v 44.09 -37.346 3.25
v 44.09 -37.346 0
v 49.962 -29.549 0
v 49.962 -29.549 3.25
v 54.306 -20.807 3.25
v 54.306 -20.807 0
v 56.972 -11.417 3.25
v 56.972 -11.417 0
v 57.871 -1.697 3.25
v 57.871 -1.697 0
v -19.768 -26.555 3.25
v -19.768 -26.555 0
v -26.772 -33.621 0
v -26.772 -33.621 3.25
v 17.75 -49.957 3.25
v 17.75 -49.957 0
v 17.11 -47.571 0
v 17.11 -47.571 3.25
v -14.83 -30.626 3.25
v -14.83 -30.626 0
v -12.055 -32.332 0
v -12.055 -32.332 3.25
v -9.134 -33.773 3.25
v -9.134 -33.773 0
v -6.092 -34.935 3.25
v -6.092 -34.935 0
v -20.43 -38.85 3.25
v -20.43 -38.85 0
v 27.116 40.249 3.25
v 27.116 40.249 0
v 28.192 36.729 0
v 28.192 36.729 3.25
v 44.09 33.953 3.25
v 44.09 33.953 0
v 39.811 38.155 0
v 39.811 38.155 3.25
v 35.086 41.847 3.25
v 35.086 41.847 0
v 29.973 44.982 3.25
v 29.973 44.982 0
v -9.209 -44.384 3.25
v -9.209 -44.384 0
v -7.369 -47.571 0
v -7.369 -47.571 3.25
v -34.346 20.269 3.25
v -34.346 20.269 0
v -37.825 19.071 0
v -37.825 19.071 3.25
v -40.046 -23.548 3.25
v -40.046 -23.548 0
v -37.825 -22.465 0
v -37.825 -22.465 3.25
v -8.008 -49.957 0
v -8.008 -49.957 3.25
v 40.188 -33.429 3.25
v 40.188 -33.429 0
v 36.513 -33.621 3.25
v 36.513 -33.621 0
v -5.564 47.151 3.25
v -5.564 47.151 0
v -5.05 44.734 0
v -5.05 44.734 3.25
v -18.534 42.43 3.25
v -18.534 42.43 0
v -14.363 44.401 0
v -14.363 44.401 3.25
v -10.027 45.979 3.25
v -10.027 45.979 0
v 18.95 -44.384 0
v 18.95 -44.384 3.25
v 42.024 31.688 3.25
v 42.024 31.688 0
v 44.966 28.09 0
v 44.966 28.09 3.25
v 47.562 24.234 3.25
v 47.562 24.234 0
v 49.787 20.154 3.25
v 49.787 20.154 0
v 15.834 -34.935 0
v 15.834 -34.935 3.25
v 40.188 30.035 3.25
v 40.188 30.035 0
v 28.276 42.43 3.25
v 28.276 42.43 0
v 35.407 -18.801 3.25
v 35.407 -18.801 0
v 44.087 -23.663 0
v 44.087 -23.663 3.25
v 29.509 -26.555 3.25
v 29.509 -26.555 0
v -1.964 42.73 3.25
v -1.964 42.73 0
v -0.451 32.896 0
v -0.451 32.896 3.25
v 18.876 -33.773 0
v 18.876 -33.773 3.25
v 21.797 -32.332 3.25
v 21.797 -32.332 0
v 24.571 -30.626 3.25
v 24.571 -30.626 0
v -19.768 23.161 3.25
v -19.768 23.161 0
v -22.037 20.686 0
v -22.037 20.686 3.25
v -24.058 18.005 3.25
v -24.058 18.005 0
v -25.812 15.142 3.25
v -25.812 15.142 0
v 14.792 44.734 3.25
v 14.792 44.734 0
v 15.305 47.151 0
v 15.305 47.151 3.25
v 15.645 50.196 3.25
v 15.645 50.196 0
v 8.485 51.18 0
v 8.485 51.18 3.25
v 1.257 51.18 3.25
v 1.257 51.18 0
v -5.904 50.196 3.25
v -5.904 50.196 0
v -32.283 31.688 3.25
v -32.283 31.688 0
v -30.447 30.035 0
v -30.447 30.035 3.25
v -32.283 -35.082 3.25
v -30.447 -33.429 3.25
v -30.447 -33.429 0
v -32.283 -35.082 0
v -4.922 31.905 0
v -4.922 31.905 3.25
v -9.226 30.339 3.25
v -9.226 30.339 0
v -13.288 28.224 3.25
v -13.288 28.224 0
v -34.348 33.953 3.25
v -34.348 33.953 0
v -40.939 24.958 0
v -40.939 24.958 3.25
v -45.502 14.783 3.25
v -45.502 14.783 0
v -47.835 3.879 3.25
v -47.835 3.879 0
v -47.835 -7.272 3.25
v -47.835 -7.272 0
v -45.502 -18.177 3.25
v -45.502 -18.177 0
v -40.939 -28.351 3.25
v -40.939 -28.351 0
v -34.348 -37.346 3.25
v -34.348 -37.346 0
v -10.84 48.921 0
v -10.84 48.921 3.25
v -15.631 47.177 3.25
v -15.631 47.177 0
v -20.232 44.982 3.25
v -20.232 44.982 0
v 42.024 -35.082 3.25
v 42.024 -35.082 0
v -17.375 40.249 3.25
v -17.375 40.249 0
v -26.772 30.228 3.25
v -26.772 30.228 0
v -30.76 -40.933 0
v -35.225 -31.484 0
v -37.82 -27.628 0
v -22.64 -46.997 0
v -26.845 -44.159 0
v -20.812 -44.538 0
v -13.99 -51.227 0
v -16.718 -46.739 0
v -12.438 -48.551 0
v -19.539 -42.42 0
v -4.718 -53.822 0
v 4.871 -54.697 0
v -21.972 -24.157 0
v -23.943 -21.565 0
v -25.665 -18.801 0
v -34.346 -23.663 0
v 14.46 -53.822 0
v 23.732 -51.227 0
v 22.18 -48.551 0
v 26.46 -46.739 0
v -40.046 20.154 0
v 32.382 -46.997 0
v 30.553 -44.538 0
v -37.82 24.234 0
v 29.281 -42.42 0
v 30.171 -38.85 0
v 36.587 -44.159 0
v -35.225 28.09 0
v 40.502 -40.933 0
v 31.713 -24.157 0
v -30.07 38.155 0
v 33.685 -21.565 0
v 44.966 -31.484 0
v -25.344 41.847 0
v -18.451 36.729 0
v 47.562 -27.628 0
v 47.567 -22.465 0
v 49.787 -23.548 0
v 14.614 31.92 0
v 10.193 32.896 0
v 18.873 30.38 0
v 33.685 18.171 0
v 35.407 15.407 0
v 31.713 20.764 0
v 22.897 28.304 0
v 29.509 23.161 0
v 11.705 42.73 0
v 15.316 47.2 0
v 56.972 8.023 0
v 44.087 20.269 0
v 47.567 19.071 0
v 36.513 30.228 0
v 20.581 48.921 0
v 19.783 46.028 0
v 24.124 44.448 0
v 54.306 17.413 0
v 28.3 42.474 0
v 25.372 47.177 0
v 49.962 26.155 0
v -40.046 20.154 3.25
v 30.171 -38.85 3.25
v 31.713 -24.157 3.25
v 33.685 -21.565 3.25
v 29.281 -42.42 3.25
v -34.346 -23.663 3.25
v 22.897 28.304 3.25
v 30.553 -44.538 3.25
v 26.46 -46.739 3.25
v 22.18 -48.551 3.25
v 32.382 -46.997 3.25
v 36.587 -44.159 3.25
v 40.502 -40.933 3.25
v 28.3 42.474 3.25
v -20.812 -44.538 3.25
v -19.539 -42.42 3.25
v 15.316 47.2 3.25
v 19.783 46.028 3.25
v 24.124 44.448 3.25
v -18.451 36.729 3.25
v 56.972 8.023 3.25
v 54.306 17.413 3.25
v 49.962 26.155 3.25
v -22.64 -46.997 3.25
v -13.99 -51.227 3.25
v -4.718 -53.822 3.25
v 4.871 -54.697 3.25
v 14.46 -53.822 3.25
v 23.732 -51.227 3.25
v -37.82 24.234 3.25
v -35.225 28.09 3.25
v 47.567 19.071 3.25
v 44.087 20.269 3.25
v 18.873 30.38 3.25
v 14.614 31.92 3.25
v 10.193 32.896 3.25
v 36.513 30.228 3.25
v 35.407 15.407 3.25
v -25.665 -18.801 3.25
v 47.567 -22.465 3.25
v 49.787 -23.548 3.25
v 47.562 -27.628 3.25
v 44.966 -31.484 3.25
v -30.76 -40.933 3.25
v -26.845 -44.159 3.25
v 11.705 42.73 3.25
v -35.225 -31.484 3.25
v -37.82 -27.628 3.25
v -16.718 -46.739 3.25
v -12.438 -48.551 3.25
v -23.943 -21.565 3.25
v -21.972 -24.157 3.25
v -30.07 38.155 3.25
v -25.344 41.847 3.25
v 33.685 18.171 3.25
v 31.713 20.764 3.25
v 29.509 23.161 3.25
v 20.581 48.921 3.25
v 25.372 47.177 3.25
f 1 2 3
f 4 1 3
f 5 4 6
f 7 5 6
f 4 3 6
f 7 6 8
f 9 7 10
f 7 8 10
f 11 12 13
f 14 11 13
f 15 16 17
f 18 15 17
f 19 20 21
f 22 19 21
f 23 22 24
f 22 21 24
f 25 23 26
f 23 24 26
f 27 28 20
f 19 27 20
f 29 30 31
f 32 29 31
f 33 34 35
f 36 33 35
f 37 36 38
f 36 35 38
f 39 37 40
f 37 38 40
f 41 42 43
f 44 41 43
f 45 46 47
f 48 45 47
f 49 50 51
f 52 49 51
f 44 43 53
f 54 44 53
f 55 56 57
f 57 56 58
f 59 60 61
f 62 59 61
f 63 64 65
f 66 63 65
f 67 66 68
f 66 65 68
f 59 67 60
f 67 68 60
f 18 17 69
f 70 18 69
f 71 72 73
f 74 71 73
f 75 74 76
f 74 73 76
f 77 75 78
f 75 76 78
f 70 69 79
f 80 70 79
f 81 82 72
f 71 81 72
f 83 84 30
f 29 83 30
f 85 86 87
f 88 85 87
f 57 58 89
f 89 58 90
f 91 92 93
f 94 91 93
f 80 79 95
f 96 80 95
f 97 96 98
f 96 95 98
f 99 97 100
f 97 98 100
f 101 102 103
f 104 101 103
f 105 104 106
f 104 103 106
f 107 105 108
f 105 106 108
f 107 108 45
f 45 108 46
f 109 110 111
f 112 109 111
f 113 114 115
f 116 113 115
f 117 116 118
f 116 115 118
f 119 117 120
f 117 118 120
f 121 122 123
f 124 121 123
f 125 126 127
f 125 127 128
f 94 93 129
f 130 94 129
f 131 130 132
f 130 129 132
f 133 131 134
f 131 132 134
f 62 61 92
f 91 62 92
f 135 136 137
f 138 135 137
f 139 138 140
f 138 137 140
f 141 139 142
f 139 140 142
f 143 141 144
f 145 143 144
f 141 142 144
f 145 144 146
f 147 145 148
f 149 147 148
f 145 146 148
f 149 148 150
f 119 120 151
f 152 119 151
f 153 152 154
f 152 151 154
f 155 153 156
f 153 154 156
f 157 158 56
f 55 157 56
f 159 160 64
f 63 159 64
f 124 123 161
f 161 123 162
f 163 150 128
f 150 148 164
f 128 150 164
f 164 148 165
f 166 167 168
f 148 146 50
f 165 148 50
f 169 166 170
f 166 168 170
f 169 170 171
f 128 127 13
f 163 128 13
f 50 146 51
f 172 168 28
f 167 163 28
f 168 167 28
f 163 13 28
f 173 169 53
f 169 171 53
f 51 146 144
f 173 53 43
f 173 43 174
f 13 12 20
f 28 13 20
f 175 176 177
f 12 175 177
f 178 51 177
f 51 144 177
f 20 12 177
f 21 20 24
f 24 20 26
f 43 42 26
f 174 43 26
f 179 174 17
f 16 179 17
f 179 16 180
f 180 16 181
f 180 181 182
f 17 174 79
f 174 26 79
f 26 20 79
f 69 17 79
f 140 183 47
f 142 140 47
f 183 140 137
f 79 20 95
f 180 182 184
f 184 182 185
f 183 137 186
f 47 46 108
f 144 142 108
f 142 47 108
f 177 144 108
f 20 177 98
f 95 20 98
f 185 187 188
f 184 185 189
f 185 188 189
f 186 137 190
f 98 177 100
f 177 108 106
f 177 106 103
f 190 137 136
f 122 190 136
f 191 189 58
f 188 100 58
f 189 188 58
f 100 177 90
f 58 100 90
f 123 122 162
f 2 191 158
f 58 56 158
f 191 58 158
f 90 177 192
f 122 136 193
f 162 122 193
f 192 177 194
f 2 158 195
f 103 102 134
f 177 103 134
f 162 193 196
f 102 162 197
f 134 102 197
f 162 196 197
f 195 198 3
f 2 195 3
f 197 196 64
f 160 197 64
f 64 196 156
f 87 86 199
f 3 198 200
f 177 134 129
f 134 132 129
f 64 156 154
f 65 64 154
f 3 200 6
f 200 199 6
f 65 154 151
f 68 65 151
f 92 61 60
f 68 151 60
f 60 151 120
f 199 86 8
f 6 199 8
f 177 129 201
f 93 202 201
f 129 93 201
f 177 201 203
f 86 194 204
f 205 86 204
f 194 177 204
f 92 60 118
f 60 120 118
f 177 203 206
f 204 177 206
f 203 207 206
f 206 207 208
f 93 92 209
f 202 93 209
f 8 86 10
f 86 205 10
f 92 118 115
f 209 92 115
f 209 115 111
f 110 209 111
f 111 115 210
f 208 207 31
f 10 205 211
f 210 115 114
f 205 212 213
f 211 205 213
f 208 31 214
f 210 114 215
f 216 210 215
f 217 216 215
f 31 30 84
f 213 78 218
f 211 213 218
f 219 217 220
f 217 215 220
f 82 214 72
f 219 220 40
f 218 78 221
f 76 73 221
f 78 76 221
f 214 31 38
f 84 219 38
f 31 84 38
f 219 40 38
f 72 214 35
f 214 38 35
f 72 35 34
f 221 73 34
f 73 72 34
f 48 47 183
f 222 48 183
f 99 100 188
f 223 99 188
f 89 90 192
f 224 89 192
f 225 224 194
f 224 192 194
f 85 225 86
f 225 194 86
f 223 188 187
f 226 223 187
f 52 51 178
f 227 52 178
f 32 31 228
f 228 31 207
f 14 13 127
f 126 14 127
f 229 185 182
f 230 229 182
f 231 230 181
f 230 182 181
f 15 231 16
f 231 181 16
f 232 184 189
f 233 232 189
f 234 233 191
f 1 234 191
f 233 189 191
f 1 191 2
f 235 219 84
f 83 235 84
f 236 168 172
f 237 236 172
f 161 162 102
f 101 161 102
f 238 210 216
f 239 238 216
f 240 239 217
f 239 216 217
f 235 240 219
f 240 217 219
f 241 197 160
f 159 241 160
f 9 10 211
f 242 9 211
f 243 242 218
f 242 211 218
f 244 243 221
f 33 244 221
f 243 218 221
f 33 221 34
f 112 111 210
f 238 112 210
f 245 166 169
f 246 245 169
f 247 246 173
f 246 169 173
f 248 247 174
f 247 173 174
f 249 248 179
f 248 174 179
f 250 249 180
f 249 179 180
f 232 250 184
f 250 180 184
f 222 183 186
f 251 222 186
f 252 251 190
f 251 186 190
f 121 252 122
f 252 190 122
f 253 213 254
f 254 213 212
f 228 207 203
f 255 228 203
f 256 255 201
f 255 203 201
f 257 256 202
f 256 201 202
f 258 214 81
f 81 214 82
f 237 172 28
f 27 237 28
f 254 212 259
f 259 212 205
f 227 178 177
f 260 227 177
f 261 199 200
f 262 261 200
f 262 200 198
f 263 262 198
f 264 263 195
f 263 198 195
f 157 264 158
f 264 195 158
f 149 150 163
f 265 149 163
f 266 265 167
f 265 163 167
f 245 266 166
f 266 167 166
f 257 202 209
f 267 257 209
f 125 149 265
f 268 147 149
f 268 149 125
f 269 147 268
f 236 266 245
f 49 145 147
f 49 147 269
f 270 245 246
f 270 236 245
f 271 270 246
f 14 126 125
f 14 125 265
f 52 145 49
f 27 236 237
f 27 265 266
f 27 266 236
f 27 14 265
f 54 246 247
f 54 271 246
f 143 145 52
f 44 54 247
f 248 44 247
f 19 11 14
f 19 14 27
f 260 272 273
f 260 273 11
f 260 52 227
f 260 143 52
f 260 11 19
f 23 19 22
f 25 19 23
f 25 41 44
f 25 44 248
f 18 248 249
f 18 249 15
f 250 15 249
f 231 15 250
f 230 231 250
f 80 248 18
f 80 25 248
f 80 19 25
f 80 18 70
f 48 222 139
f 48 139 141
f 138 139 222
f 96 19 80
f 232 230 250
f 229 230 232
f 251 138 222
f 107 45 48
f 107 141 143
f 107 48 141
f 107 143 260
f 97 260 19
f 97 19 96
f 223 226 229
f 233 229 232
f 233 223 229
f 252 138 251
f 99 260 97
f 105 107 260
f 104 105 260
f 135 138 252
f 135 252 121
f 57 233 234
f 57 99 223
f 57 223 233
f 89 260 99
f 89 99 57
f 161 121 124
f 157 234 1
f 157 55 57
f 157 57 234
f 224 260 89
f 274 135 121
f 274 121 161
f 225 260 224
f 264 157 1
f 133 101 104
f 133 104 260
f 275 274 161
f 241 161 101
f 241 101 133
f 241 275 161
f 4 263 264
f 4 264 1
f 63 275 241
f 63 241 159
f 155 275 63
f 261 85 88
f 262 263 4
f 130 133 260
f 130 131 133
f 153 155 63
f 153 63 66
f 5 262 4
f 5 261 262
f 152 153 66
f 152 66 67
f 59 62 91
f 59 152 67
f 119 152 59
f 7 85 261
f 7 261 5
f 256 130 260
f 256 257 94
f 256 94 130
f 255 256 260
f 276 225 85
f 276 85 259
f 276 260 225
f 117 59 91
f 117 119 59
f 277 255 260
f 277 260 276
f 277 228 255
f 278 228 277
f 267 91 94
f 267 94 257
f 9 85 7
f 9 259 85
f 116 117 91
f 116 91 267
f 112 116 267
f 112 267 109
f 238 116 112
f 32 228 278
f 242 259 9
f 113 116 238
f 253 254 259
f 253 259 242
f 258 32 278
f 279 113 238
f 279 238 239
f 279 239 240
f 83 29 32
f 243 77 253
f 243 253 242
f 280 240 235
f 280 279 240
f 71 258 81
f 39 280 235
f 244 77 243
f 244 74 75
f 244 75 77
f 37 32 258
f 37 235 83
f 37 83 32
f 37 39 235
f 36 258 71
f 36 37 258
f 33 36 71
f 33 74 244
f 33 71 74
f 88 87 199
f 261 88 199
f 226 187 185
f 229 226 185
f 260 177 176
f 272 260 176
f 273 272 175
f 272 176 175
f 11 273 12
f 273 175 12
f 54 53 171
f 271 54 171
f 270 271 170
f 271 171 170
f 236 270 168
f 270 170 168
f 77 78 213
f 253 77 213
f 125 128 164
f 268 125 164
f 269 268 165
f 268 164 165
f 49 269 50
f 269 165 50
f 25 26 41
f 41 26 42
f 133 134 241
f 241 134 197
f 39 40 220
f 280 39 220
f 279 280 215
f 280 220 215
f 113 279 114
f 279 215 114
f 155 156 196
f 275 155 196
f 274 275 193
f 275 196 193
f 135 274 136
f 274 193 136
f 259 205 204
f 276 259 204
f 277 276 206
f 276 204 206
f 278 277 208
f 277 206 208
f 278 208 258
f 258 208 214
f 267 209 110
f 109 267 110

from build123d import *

# Parameters (mm, degrees)
SKETCH1_R           = 53
BOSS_EXTRUDE2_DEPTH = 3.25


with BuildPart() as part:
    # Sketch1 → Boss-Extrude2 (new body)
    with BuildSketch(Plane.XY):
        with Locations((4.870724861, -1.696758811)):
            Circle(SKETCH1_R)
        with BuildLine():
            Line((47.566786932, -22.464700122), (49.787097659, -23.547618021))
            ThreePointArc((49.787097659, -23.547618021), (46.308922772, -29.586117847), (42.024200497, -35.081783024))
            Line((42.024200497, -35.081783024), (40.188393468, -33.42881495))
            Line((40.188393468, -33.42881495), (36.513472454, -33.621409399))
            Line((36.513472454, -33.621409399), (29.509466442, -26.555005195))
            ThreePointArc((29.509466442, -26.555005195), (32.729283137, -22.88403638), (35.406864683, -18.800681308))
            Line((35.406864683, -18.800681308), (44.08731235, -23.662779301))
            Line((44.08731235, -23.662779301), (47.566786932, -22.464700122))
        make_face(mode=Mode.SUBTRACT)
        with BuildLine():
            Line((47.566786932, 19.071182501), (44.08731235, 20.26926168))
            Line((44.08731235, 20.26926168), (35.406864683, 15.407163687))
            ThreePointArc((35.406864683, 15.407163687), (32.729283137, 19.490518759), (29.509466442, 23.161487574))
            Line((29.509466442, 23.161487574), (36.513472454, 30.227891778))
            Line((36.513472454, 30.227891778), (40.188393468, 30.035297329))
            Line((40.188393468, 30.035297329), (42.024200497, 31.688265402))
            ThreePointArc((42.024200497, 31.688265402), (46.308922772, 26.192600226), (49.787097659, 20.1541004))
            Line((49.787097659, 20.1541004), (47.566786932, 19.071182501))
        make_face(mode=Mode.SUBTRACT)
        with BuildLine():
            Line((28.299596439, 42.474362712), (27.116085982, 40.248503273))
            Line((27.116085982, 40.248503273), (28.192003411, 36.729335933))
            Line((28.192003411, 36.729335933), (22.897057483, 28.304096714))
            ThreePointArc((22.897057483, 28.304096714), (16.768473858, 31.218945174), (10.192574898, 32.896273901))
            Line((10.192574898, 32.896273901), (11.705406612, 42.729966432))
            Line((11.705406612, 42.729966432), (14.791684342, 44.734218625))
            Line((14.791684342, 44.734218625), (15.315817601, 47.200071738))
            ThreePointArc((15.315817601, 47.200071738), (21.971732028, 45.287872229), (28.299596439, 42.474362712))
        make_face(mode=Mode.SUBTRACT)
        with BuildLine():
            ThreePointArc((-18.5343822, 42.429668157), (-12.212969352, 45.240305281), (-5.563843448, 47.150558185))
            Line((-5.563843448, 47.150558185), (-5.05023462, 44.734218625))
            Line((-5.05023462, 44.734218625), (-1.963956889, 42.729966432))
            Line((-1.963956889, 42.729966432), (-0.451125175, 32.896273901))
            ThreePointArc((-0.451125175, 32.896273901), (-7.099980155, 31.192482917), (-13.288474299, 28.223860933))
            Line((-13.288474299, 28.223860933), (-18.450553688, 36.729335933))
            Line((-18.450553688, 36.729335933), (-17.374636259, 40.248503273))
            Line((-17.374636259, 40.248503273), (-18.5343822, 42.429668157))
        make_face(mode=Mode.SUBTRACT)
        with BuildLine():
            ThreePointArc((-40.045647936, 20.1541004), (-36.567473049, 26.192600226), (-32.282750775, 31.688265402))
            Line((-32.282750775, 31.688265402), (-30.446943745, 30.035297329))
            Line((-30.446943745, 30.035297329), (-26.772022731, 30.227891778))
            Line((-26.772022731, 30.227891778), (-19.76801672, 23.161487574))
            ThreePointArc((-19.76801672, 23.161487574), (-23.079377371, 19.369607397), (-25.812491143, 15.141894807))
            Line((-25.812491143, 15.141894807), (-34.345862627, 20.26926168))
            Line((-34.345862627, 20.26926168), (-37.825337209, 19.071182501))
            Line((-37.825337209, 19.071182501), (-40.045647936, 20.1541004))
        make_face(mode=Mode.SUBTRACT)
        with BuildLine():
            ThreePointArc((-32.282750775, -35.081783024), (-36.567473049, -29.586117847), (-40.045647936, -23.547618021))
            Line((-40.045647936, -23.547618021), (-37.825337209, -22.464700122))
            Line((-37.825337209, -22.464700122), (-34.345862627, -23.662779301))
            Line((-34.345862627, -23.662779301), (-25.66541496, -18.800681308))
            ThreePointArc((-25.66541496, -18.800681308), (-22.987833414, -22.88403638), (-19.76801672, -26.555005195))
            Line((-19.76801672, -26.555005195), (-26.772022731, -33.621409399))
            Line((-26.772022731, -33.621409399), (-30.446943745, -33.42881495))
            Line((-30.446943745, -33.42881495), (-32.282750775, -35.081783024))
        make_face(mode=Mode.SUBTRACT)
        with BuildLine():
            ThreePointArc((-8.008224552, -49.957231825), (-14.599447184, -47.695160892), (-20.811705065, -44.537783385))
            Line((-20.811705065, -44.537783385), (-19.539395166, -42.420304124))
            Line((-19.539395166, -42.420304124), (-20.4296591, -38.849650513))
            Line((-20.4296591, -38.849650513), (-14.829511994, -30.625994332))
            ThreePointArc((-14.829511994, -30.625994332), (-10.611619227, -33.086200053), (-6.092380244, -34.935446006))
            Line((-6.092380244, -34.935446006), (-9.208840303, -44.384141433))
            Line((-9.208840303, -44.384141433), (-7.368858164, -47.571083983))
            Line((-7.368858164, -47.571083983), (-8.008224552, -49.957231825))
        make_face(mode=Mode.SUBTRACT)
        with BuildLine():
            ThreePointArc((30.553154788, -44.537783385), (24.340896907, -47.695160892), (17.749674274, -49.957231825))
            Line((17.749674274, -49.957231825), (17.110307887, -47.571083983))
            Line((17.110307887, -47.571083983), (18.950290026, -44.384141433))
            Line((18.950290026, -44.384141433), (15.833829966, -34.935446006))
            ThreePointArc((15.833829966, -34.935446006), (20.35306895, -33.086200053), (24.570961717, -30.625994332))
            Line((24.570961717, -30.625994332), (30.171108822, -38.849650513))
            Line((30.171108822, -38.849650513), (29.280844889, -42.420304124))
            Line((29.280844889, -42.420304124), (30.553154788, -44.537783385))
        make_face(mode=Mode.SUBTRACT)
    extrude(amount=BOSS_EXTRUDE2_DEPTH)


solid = part.part
